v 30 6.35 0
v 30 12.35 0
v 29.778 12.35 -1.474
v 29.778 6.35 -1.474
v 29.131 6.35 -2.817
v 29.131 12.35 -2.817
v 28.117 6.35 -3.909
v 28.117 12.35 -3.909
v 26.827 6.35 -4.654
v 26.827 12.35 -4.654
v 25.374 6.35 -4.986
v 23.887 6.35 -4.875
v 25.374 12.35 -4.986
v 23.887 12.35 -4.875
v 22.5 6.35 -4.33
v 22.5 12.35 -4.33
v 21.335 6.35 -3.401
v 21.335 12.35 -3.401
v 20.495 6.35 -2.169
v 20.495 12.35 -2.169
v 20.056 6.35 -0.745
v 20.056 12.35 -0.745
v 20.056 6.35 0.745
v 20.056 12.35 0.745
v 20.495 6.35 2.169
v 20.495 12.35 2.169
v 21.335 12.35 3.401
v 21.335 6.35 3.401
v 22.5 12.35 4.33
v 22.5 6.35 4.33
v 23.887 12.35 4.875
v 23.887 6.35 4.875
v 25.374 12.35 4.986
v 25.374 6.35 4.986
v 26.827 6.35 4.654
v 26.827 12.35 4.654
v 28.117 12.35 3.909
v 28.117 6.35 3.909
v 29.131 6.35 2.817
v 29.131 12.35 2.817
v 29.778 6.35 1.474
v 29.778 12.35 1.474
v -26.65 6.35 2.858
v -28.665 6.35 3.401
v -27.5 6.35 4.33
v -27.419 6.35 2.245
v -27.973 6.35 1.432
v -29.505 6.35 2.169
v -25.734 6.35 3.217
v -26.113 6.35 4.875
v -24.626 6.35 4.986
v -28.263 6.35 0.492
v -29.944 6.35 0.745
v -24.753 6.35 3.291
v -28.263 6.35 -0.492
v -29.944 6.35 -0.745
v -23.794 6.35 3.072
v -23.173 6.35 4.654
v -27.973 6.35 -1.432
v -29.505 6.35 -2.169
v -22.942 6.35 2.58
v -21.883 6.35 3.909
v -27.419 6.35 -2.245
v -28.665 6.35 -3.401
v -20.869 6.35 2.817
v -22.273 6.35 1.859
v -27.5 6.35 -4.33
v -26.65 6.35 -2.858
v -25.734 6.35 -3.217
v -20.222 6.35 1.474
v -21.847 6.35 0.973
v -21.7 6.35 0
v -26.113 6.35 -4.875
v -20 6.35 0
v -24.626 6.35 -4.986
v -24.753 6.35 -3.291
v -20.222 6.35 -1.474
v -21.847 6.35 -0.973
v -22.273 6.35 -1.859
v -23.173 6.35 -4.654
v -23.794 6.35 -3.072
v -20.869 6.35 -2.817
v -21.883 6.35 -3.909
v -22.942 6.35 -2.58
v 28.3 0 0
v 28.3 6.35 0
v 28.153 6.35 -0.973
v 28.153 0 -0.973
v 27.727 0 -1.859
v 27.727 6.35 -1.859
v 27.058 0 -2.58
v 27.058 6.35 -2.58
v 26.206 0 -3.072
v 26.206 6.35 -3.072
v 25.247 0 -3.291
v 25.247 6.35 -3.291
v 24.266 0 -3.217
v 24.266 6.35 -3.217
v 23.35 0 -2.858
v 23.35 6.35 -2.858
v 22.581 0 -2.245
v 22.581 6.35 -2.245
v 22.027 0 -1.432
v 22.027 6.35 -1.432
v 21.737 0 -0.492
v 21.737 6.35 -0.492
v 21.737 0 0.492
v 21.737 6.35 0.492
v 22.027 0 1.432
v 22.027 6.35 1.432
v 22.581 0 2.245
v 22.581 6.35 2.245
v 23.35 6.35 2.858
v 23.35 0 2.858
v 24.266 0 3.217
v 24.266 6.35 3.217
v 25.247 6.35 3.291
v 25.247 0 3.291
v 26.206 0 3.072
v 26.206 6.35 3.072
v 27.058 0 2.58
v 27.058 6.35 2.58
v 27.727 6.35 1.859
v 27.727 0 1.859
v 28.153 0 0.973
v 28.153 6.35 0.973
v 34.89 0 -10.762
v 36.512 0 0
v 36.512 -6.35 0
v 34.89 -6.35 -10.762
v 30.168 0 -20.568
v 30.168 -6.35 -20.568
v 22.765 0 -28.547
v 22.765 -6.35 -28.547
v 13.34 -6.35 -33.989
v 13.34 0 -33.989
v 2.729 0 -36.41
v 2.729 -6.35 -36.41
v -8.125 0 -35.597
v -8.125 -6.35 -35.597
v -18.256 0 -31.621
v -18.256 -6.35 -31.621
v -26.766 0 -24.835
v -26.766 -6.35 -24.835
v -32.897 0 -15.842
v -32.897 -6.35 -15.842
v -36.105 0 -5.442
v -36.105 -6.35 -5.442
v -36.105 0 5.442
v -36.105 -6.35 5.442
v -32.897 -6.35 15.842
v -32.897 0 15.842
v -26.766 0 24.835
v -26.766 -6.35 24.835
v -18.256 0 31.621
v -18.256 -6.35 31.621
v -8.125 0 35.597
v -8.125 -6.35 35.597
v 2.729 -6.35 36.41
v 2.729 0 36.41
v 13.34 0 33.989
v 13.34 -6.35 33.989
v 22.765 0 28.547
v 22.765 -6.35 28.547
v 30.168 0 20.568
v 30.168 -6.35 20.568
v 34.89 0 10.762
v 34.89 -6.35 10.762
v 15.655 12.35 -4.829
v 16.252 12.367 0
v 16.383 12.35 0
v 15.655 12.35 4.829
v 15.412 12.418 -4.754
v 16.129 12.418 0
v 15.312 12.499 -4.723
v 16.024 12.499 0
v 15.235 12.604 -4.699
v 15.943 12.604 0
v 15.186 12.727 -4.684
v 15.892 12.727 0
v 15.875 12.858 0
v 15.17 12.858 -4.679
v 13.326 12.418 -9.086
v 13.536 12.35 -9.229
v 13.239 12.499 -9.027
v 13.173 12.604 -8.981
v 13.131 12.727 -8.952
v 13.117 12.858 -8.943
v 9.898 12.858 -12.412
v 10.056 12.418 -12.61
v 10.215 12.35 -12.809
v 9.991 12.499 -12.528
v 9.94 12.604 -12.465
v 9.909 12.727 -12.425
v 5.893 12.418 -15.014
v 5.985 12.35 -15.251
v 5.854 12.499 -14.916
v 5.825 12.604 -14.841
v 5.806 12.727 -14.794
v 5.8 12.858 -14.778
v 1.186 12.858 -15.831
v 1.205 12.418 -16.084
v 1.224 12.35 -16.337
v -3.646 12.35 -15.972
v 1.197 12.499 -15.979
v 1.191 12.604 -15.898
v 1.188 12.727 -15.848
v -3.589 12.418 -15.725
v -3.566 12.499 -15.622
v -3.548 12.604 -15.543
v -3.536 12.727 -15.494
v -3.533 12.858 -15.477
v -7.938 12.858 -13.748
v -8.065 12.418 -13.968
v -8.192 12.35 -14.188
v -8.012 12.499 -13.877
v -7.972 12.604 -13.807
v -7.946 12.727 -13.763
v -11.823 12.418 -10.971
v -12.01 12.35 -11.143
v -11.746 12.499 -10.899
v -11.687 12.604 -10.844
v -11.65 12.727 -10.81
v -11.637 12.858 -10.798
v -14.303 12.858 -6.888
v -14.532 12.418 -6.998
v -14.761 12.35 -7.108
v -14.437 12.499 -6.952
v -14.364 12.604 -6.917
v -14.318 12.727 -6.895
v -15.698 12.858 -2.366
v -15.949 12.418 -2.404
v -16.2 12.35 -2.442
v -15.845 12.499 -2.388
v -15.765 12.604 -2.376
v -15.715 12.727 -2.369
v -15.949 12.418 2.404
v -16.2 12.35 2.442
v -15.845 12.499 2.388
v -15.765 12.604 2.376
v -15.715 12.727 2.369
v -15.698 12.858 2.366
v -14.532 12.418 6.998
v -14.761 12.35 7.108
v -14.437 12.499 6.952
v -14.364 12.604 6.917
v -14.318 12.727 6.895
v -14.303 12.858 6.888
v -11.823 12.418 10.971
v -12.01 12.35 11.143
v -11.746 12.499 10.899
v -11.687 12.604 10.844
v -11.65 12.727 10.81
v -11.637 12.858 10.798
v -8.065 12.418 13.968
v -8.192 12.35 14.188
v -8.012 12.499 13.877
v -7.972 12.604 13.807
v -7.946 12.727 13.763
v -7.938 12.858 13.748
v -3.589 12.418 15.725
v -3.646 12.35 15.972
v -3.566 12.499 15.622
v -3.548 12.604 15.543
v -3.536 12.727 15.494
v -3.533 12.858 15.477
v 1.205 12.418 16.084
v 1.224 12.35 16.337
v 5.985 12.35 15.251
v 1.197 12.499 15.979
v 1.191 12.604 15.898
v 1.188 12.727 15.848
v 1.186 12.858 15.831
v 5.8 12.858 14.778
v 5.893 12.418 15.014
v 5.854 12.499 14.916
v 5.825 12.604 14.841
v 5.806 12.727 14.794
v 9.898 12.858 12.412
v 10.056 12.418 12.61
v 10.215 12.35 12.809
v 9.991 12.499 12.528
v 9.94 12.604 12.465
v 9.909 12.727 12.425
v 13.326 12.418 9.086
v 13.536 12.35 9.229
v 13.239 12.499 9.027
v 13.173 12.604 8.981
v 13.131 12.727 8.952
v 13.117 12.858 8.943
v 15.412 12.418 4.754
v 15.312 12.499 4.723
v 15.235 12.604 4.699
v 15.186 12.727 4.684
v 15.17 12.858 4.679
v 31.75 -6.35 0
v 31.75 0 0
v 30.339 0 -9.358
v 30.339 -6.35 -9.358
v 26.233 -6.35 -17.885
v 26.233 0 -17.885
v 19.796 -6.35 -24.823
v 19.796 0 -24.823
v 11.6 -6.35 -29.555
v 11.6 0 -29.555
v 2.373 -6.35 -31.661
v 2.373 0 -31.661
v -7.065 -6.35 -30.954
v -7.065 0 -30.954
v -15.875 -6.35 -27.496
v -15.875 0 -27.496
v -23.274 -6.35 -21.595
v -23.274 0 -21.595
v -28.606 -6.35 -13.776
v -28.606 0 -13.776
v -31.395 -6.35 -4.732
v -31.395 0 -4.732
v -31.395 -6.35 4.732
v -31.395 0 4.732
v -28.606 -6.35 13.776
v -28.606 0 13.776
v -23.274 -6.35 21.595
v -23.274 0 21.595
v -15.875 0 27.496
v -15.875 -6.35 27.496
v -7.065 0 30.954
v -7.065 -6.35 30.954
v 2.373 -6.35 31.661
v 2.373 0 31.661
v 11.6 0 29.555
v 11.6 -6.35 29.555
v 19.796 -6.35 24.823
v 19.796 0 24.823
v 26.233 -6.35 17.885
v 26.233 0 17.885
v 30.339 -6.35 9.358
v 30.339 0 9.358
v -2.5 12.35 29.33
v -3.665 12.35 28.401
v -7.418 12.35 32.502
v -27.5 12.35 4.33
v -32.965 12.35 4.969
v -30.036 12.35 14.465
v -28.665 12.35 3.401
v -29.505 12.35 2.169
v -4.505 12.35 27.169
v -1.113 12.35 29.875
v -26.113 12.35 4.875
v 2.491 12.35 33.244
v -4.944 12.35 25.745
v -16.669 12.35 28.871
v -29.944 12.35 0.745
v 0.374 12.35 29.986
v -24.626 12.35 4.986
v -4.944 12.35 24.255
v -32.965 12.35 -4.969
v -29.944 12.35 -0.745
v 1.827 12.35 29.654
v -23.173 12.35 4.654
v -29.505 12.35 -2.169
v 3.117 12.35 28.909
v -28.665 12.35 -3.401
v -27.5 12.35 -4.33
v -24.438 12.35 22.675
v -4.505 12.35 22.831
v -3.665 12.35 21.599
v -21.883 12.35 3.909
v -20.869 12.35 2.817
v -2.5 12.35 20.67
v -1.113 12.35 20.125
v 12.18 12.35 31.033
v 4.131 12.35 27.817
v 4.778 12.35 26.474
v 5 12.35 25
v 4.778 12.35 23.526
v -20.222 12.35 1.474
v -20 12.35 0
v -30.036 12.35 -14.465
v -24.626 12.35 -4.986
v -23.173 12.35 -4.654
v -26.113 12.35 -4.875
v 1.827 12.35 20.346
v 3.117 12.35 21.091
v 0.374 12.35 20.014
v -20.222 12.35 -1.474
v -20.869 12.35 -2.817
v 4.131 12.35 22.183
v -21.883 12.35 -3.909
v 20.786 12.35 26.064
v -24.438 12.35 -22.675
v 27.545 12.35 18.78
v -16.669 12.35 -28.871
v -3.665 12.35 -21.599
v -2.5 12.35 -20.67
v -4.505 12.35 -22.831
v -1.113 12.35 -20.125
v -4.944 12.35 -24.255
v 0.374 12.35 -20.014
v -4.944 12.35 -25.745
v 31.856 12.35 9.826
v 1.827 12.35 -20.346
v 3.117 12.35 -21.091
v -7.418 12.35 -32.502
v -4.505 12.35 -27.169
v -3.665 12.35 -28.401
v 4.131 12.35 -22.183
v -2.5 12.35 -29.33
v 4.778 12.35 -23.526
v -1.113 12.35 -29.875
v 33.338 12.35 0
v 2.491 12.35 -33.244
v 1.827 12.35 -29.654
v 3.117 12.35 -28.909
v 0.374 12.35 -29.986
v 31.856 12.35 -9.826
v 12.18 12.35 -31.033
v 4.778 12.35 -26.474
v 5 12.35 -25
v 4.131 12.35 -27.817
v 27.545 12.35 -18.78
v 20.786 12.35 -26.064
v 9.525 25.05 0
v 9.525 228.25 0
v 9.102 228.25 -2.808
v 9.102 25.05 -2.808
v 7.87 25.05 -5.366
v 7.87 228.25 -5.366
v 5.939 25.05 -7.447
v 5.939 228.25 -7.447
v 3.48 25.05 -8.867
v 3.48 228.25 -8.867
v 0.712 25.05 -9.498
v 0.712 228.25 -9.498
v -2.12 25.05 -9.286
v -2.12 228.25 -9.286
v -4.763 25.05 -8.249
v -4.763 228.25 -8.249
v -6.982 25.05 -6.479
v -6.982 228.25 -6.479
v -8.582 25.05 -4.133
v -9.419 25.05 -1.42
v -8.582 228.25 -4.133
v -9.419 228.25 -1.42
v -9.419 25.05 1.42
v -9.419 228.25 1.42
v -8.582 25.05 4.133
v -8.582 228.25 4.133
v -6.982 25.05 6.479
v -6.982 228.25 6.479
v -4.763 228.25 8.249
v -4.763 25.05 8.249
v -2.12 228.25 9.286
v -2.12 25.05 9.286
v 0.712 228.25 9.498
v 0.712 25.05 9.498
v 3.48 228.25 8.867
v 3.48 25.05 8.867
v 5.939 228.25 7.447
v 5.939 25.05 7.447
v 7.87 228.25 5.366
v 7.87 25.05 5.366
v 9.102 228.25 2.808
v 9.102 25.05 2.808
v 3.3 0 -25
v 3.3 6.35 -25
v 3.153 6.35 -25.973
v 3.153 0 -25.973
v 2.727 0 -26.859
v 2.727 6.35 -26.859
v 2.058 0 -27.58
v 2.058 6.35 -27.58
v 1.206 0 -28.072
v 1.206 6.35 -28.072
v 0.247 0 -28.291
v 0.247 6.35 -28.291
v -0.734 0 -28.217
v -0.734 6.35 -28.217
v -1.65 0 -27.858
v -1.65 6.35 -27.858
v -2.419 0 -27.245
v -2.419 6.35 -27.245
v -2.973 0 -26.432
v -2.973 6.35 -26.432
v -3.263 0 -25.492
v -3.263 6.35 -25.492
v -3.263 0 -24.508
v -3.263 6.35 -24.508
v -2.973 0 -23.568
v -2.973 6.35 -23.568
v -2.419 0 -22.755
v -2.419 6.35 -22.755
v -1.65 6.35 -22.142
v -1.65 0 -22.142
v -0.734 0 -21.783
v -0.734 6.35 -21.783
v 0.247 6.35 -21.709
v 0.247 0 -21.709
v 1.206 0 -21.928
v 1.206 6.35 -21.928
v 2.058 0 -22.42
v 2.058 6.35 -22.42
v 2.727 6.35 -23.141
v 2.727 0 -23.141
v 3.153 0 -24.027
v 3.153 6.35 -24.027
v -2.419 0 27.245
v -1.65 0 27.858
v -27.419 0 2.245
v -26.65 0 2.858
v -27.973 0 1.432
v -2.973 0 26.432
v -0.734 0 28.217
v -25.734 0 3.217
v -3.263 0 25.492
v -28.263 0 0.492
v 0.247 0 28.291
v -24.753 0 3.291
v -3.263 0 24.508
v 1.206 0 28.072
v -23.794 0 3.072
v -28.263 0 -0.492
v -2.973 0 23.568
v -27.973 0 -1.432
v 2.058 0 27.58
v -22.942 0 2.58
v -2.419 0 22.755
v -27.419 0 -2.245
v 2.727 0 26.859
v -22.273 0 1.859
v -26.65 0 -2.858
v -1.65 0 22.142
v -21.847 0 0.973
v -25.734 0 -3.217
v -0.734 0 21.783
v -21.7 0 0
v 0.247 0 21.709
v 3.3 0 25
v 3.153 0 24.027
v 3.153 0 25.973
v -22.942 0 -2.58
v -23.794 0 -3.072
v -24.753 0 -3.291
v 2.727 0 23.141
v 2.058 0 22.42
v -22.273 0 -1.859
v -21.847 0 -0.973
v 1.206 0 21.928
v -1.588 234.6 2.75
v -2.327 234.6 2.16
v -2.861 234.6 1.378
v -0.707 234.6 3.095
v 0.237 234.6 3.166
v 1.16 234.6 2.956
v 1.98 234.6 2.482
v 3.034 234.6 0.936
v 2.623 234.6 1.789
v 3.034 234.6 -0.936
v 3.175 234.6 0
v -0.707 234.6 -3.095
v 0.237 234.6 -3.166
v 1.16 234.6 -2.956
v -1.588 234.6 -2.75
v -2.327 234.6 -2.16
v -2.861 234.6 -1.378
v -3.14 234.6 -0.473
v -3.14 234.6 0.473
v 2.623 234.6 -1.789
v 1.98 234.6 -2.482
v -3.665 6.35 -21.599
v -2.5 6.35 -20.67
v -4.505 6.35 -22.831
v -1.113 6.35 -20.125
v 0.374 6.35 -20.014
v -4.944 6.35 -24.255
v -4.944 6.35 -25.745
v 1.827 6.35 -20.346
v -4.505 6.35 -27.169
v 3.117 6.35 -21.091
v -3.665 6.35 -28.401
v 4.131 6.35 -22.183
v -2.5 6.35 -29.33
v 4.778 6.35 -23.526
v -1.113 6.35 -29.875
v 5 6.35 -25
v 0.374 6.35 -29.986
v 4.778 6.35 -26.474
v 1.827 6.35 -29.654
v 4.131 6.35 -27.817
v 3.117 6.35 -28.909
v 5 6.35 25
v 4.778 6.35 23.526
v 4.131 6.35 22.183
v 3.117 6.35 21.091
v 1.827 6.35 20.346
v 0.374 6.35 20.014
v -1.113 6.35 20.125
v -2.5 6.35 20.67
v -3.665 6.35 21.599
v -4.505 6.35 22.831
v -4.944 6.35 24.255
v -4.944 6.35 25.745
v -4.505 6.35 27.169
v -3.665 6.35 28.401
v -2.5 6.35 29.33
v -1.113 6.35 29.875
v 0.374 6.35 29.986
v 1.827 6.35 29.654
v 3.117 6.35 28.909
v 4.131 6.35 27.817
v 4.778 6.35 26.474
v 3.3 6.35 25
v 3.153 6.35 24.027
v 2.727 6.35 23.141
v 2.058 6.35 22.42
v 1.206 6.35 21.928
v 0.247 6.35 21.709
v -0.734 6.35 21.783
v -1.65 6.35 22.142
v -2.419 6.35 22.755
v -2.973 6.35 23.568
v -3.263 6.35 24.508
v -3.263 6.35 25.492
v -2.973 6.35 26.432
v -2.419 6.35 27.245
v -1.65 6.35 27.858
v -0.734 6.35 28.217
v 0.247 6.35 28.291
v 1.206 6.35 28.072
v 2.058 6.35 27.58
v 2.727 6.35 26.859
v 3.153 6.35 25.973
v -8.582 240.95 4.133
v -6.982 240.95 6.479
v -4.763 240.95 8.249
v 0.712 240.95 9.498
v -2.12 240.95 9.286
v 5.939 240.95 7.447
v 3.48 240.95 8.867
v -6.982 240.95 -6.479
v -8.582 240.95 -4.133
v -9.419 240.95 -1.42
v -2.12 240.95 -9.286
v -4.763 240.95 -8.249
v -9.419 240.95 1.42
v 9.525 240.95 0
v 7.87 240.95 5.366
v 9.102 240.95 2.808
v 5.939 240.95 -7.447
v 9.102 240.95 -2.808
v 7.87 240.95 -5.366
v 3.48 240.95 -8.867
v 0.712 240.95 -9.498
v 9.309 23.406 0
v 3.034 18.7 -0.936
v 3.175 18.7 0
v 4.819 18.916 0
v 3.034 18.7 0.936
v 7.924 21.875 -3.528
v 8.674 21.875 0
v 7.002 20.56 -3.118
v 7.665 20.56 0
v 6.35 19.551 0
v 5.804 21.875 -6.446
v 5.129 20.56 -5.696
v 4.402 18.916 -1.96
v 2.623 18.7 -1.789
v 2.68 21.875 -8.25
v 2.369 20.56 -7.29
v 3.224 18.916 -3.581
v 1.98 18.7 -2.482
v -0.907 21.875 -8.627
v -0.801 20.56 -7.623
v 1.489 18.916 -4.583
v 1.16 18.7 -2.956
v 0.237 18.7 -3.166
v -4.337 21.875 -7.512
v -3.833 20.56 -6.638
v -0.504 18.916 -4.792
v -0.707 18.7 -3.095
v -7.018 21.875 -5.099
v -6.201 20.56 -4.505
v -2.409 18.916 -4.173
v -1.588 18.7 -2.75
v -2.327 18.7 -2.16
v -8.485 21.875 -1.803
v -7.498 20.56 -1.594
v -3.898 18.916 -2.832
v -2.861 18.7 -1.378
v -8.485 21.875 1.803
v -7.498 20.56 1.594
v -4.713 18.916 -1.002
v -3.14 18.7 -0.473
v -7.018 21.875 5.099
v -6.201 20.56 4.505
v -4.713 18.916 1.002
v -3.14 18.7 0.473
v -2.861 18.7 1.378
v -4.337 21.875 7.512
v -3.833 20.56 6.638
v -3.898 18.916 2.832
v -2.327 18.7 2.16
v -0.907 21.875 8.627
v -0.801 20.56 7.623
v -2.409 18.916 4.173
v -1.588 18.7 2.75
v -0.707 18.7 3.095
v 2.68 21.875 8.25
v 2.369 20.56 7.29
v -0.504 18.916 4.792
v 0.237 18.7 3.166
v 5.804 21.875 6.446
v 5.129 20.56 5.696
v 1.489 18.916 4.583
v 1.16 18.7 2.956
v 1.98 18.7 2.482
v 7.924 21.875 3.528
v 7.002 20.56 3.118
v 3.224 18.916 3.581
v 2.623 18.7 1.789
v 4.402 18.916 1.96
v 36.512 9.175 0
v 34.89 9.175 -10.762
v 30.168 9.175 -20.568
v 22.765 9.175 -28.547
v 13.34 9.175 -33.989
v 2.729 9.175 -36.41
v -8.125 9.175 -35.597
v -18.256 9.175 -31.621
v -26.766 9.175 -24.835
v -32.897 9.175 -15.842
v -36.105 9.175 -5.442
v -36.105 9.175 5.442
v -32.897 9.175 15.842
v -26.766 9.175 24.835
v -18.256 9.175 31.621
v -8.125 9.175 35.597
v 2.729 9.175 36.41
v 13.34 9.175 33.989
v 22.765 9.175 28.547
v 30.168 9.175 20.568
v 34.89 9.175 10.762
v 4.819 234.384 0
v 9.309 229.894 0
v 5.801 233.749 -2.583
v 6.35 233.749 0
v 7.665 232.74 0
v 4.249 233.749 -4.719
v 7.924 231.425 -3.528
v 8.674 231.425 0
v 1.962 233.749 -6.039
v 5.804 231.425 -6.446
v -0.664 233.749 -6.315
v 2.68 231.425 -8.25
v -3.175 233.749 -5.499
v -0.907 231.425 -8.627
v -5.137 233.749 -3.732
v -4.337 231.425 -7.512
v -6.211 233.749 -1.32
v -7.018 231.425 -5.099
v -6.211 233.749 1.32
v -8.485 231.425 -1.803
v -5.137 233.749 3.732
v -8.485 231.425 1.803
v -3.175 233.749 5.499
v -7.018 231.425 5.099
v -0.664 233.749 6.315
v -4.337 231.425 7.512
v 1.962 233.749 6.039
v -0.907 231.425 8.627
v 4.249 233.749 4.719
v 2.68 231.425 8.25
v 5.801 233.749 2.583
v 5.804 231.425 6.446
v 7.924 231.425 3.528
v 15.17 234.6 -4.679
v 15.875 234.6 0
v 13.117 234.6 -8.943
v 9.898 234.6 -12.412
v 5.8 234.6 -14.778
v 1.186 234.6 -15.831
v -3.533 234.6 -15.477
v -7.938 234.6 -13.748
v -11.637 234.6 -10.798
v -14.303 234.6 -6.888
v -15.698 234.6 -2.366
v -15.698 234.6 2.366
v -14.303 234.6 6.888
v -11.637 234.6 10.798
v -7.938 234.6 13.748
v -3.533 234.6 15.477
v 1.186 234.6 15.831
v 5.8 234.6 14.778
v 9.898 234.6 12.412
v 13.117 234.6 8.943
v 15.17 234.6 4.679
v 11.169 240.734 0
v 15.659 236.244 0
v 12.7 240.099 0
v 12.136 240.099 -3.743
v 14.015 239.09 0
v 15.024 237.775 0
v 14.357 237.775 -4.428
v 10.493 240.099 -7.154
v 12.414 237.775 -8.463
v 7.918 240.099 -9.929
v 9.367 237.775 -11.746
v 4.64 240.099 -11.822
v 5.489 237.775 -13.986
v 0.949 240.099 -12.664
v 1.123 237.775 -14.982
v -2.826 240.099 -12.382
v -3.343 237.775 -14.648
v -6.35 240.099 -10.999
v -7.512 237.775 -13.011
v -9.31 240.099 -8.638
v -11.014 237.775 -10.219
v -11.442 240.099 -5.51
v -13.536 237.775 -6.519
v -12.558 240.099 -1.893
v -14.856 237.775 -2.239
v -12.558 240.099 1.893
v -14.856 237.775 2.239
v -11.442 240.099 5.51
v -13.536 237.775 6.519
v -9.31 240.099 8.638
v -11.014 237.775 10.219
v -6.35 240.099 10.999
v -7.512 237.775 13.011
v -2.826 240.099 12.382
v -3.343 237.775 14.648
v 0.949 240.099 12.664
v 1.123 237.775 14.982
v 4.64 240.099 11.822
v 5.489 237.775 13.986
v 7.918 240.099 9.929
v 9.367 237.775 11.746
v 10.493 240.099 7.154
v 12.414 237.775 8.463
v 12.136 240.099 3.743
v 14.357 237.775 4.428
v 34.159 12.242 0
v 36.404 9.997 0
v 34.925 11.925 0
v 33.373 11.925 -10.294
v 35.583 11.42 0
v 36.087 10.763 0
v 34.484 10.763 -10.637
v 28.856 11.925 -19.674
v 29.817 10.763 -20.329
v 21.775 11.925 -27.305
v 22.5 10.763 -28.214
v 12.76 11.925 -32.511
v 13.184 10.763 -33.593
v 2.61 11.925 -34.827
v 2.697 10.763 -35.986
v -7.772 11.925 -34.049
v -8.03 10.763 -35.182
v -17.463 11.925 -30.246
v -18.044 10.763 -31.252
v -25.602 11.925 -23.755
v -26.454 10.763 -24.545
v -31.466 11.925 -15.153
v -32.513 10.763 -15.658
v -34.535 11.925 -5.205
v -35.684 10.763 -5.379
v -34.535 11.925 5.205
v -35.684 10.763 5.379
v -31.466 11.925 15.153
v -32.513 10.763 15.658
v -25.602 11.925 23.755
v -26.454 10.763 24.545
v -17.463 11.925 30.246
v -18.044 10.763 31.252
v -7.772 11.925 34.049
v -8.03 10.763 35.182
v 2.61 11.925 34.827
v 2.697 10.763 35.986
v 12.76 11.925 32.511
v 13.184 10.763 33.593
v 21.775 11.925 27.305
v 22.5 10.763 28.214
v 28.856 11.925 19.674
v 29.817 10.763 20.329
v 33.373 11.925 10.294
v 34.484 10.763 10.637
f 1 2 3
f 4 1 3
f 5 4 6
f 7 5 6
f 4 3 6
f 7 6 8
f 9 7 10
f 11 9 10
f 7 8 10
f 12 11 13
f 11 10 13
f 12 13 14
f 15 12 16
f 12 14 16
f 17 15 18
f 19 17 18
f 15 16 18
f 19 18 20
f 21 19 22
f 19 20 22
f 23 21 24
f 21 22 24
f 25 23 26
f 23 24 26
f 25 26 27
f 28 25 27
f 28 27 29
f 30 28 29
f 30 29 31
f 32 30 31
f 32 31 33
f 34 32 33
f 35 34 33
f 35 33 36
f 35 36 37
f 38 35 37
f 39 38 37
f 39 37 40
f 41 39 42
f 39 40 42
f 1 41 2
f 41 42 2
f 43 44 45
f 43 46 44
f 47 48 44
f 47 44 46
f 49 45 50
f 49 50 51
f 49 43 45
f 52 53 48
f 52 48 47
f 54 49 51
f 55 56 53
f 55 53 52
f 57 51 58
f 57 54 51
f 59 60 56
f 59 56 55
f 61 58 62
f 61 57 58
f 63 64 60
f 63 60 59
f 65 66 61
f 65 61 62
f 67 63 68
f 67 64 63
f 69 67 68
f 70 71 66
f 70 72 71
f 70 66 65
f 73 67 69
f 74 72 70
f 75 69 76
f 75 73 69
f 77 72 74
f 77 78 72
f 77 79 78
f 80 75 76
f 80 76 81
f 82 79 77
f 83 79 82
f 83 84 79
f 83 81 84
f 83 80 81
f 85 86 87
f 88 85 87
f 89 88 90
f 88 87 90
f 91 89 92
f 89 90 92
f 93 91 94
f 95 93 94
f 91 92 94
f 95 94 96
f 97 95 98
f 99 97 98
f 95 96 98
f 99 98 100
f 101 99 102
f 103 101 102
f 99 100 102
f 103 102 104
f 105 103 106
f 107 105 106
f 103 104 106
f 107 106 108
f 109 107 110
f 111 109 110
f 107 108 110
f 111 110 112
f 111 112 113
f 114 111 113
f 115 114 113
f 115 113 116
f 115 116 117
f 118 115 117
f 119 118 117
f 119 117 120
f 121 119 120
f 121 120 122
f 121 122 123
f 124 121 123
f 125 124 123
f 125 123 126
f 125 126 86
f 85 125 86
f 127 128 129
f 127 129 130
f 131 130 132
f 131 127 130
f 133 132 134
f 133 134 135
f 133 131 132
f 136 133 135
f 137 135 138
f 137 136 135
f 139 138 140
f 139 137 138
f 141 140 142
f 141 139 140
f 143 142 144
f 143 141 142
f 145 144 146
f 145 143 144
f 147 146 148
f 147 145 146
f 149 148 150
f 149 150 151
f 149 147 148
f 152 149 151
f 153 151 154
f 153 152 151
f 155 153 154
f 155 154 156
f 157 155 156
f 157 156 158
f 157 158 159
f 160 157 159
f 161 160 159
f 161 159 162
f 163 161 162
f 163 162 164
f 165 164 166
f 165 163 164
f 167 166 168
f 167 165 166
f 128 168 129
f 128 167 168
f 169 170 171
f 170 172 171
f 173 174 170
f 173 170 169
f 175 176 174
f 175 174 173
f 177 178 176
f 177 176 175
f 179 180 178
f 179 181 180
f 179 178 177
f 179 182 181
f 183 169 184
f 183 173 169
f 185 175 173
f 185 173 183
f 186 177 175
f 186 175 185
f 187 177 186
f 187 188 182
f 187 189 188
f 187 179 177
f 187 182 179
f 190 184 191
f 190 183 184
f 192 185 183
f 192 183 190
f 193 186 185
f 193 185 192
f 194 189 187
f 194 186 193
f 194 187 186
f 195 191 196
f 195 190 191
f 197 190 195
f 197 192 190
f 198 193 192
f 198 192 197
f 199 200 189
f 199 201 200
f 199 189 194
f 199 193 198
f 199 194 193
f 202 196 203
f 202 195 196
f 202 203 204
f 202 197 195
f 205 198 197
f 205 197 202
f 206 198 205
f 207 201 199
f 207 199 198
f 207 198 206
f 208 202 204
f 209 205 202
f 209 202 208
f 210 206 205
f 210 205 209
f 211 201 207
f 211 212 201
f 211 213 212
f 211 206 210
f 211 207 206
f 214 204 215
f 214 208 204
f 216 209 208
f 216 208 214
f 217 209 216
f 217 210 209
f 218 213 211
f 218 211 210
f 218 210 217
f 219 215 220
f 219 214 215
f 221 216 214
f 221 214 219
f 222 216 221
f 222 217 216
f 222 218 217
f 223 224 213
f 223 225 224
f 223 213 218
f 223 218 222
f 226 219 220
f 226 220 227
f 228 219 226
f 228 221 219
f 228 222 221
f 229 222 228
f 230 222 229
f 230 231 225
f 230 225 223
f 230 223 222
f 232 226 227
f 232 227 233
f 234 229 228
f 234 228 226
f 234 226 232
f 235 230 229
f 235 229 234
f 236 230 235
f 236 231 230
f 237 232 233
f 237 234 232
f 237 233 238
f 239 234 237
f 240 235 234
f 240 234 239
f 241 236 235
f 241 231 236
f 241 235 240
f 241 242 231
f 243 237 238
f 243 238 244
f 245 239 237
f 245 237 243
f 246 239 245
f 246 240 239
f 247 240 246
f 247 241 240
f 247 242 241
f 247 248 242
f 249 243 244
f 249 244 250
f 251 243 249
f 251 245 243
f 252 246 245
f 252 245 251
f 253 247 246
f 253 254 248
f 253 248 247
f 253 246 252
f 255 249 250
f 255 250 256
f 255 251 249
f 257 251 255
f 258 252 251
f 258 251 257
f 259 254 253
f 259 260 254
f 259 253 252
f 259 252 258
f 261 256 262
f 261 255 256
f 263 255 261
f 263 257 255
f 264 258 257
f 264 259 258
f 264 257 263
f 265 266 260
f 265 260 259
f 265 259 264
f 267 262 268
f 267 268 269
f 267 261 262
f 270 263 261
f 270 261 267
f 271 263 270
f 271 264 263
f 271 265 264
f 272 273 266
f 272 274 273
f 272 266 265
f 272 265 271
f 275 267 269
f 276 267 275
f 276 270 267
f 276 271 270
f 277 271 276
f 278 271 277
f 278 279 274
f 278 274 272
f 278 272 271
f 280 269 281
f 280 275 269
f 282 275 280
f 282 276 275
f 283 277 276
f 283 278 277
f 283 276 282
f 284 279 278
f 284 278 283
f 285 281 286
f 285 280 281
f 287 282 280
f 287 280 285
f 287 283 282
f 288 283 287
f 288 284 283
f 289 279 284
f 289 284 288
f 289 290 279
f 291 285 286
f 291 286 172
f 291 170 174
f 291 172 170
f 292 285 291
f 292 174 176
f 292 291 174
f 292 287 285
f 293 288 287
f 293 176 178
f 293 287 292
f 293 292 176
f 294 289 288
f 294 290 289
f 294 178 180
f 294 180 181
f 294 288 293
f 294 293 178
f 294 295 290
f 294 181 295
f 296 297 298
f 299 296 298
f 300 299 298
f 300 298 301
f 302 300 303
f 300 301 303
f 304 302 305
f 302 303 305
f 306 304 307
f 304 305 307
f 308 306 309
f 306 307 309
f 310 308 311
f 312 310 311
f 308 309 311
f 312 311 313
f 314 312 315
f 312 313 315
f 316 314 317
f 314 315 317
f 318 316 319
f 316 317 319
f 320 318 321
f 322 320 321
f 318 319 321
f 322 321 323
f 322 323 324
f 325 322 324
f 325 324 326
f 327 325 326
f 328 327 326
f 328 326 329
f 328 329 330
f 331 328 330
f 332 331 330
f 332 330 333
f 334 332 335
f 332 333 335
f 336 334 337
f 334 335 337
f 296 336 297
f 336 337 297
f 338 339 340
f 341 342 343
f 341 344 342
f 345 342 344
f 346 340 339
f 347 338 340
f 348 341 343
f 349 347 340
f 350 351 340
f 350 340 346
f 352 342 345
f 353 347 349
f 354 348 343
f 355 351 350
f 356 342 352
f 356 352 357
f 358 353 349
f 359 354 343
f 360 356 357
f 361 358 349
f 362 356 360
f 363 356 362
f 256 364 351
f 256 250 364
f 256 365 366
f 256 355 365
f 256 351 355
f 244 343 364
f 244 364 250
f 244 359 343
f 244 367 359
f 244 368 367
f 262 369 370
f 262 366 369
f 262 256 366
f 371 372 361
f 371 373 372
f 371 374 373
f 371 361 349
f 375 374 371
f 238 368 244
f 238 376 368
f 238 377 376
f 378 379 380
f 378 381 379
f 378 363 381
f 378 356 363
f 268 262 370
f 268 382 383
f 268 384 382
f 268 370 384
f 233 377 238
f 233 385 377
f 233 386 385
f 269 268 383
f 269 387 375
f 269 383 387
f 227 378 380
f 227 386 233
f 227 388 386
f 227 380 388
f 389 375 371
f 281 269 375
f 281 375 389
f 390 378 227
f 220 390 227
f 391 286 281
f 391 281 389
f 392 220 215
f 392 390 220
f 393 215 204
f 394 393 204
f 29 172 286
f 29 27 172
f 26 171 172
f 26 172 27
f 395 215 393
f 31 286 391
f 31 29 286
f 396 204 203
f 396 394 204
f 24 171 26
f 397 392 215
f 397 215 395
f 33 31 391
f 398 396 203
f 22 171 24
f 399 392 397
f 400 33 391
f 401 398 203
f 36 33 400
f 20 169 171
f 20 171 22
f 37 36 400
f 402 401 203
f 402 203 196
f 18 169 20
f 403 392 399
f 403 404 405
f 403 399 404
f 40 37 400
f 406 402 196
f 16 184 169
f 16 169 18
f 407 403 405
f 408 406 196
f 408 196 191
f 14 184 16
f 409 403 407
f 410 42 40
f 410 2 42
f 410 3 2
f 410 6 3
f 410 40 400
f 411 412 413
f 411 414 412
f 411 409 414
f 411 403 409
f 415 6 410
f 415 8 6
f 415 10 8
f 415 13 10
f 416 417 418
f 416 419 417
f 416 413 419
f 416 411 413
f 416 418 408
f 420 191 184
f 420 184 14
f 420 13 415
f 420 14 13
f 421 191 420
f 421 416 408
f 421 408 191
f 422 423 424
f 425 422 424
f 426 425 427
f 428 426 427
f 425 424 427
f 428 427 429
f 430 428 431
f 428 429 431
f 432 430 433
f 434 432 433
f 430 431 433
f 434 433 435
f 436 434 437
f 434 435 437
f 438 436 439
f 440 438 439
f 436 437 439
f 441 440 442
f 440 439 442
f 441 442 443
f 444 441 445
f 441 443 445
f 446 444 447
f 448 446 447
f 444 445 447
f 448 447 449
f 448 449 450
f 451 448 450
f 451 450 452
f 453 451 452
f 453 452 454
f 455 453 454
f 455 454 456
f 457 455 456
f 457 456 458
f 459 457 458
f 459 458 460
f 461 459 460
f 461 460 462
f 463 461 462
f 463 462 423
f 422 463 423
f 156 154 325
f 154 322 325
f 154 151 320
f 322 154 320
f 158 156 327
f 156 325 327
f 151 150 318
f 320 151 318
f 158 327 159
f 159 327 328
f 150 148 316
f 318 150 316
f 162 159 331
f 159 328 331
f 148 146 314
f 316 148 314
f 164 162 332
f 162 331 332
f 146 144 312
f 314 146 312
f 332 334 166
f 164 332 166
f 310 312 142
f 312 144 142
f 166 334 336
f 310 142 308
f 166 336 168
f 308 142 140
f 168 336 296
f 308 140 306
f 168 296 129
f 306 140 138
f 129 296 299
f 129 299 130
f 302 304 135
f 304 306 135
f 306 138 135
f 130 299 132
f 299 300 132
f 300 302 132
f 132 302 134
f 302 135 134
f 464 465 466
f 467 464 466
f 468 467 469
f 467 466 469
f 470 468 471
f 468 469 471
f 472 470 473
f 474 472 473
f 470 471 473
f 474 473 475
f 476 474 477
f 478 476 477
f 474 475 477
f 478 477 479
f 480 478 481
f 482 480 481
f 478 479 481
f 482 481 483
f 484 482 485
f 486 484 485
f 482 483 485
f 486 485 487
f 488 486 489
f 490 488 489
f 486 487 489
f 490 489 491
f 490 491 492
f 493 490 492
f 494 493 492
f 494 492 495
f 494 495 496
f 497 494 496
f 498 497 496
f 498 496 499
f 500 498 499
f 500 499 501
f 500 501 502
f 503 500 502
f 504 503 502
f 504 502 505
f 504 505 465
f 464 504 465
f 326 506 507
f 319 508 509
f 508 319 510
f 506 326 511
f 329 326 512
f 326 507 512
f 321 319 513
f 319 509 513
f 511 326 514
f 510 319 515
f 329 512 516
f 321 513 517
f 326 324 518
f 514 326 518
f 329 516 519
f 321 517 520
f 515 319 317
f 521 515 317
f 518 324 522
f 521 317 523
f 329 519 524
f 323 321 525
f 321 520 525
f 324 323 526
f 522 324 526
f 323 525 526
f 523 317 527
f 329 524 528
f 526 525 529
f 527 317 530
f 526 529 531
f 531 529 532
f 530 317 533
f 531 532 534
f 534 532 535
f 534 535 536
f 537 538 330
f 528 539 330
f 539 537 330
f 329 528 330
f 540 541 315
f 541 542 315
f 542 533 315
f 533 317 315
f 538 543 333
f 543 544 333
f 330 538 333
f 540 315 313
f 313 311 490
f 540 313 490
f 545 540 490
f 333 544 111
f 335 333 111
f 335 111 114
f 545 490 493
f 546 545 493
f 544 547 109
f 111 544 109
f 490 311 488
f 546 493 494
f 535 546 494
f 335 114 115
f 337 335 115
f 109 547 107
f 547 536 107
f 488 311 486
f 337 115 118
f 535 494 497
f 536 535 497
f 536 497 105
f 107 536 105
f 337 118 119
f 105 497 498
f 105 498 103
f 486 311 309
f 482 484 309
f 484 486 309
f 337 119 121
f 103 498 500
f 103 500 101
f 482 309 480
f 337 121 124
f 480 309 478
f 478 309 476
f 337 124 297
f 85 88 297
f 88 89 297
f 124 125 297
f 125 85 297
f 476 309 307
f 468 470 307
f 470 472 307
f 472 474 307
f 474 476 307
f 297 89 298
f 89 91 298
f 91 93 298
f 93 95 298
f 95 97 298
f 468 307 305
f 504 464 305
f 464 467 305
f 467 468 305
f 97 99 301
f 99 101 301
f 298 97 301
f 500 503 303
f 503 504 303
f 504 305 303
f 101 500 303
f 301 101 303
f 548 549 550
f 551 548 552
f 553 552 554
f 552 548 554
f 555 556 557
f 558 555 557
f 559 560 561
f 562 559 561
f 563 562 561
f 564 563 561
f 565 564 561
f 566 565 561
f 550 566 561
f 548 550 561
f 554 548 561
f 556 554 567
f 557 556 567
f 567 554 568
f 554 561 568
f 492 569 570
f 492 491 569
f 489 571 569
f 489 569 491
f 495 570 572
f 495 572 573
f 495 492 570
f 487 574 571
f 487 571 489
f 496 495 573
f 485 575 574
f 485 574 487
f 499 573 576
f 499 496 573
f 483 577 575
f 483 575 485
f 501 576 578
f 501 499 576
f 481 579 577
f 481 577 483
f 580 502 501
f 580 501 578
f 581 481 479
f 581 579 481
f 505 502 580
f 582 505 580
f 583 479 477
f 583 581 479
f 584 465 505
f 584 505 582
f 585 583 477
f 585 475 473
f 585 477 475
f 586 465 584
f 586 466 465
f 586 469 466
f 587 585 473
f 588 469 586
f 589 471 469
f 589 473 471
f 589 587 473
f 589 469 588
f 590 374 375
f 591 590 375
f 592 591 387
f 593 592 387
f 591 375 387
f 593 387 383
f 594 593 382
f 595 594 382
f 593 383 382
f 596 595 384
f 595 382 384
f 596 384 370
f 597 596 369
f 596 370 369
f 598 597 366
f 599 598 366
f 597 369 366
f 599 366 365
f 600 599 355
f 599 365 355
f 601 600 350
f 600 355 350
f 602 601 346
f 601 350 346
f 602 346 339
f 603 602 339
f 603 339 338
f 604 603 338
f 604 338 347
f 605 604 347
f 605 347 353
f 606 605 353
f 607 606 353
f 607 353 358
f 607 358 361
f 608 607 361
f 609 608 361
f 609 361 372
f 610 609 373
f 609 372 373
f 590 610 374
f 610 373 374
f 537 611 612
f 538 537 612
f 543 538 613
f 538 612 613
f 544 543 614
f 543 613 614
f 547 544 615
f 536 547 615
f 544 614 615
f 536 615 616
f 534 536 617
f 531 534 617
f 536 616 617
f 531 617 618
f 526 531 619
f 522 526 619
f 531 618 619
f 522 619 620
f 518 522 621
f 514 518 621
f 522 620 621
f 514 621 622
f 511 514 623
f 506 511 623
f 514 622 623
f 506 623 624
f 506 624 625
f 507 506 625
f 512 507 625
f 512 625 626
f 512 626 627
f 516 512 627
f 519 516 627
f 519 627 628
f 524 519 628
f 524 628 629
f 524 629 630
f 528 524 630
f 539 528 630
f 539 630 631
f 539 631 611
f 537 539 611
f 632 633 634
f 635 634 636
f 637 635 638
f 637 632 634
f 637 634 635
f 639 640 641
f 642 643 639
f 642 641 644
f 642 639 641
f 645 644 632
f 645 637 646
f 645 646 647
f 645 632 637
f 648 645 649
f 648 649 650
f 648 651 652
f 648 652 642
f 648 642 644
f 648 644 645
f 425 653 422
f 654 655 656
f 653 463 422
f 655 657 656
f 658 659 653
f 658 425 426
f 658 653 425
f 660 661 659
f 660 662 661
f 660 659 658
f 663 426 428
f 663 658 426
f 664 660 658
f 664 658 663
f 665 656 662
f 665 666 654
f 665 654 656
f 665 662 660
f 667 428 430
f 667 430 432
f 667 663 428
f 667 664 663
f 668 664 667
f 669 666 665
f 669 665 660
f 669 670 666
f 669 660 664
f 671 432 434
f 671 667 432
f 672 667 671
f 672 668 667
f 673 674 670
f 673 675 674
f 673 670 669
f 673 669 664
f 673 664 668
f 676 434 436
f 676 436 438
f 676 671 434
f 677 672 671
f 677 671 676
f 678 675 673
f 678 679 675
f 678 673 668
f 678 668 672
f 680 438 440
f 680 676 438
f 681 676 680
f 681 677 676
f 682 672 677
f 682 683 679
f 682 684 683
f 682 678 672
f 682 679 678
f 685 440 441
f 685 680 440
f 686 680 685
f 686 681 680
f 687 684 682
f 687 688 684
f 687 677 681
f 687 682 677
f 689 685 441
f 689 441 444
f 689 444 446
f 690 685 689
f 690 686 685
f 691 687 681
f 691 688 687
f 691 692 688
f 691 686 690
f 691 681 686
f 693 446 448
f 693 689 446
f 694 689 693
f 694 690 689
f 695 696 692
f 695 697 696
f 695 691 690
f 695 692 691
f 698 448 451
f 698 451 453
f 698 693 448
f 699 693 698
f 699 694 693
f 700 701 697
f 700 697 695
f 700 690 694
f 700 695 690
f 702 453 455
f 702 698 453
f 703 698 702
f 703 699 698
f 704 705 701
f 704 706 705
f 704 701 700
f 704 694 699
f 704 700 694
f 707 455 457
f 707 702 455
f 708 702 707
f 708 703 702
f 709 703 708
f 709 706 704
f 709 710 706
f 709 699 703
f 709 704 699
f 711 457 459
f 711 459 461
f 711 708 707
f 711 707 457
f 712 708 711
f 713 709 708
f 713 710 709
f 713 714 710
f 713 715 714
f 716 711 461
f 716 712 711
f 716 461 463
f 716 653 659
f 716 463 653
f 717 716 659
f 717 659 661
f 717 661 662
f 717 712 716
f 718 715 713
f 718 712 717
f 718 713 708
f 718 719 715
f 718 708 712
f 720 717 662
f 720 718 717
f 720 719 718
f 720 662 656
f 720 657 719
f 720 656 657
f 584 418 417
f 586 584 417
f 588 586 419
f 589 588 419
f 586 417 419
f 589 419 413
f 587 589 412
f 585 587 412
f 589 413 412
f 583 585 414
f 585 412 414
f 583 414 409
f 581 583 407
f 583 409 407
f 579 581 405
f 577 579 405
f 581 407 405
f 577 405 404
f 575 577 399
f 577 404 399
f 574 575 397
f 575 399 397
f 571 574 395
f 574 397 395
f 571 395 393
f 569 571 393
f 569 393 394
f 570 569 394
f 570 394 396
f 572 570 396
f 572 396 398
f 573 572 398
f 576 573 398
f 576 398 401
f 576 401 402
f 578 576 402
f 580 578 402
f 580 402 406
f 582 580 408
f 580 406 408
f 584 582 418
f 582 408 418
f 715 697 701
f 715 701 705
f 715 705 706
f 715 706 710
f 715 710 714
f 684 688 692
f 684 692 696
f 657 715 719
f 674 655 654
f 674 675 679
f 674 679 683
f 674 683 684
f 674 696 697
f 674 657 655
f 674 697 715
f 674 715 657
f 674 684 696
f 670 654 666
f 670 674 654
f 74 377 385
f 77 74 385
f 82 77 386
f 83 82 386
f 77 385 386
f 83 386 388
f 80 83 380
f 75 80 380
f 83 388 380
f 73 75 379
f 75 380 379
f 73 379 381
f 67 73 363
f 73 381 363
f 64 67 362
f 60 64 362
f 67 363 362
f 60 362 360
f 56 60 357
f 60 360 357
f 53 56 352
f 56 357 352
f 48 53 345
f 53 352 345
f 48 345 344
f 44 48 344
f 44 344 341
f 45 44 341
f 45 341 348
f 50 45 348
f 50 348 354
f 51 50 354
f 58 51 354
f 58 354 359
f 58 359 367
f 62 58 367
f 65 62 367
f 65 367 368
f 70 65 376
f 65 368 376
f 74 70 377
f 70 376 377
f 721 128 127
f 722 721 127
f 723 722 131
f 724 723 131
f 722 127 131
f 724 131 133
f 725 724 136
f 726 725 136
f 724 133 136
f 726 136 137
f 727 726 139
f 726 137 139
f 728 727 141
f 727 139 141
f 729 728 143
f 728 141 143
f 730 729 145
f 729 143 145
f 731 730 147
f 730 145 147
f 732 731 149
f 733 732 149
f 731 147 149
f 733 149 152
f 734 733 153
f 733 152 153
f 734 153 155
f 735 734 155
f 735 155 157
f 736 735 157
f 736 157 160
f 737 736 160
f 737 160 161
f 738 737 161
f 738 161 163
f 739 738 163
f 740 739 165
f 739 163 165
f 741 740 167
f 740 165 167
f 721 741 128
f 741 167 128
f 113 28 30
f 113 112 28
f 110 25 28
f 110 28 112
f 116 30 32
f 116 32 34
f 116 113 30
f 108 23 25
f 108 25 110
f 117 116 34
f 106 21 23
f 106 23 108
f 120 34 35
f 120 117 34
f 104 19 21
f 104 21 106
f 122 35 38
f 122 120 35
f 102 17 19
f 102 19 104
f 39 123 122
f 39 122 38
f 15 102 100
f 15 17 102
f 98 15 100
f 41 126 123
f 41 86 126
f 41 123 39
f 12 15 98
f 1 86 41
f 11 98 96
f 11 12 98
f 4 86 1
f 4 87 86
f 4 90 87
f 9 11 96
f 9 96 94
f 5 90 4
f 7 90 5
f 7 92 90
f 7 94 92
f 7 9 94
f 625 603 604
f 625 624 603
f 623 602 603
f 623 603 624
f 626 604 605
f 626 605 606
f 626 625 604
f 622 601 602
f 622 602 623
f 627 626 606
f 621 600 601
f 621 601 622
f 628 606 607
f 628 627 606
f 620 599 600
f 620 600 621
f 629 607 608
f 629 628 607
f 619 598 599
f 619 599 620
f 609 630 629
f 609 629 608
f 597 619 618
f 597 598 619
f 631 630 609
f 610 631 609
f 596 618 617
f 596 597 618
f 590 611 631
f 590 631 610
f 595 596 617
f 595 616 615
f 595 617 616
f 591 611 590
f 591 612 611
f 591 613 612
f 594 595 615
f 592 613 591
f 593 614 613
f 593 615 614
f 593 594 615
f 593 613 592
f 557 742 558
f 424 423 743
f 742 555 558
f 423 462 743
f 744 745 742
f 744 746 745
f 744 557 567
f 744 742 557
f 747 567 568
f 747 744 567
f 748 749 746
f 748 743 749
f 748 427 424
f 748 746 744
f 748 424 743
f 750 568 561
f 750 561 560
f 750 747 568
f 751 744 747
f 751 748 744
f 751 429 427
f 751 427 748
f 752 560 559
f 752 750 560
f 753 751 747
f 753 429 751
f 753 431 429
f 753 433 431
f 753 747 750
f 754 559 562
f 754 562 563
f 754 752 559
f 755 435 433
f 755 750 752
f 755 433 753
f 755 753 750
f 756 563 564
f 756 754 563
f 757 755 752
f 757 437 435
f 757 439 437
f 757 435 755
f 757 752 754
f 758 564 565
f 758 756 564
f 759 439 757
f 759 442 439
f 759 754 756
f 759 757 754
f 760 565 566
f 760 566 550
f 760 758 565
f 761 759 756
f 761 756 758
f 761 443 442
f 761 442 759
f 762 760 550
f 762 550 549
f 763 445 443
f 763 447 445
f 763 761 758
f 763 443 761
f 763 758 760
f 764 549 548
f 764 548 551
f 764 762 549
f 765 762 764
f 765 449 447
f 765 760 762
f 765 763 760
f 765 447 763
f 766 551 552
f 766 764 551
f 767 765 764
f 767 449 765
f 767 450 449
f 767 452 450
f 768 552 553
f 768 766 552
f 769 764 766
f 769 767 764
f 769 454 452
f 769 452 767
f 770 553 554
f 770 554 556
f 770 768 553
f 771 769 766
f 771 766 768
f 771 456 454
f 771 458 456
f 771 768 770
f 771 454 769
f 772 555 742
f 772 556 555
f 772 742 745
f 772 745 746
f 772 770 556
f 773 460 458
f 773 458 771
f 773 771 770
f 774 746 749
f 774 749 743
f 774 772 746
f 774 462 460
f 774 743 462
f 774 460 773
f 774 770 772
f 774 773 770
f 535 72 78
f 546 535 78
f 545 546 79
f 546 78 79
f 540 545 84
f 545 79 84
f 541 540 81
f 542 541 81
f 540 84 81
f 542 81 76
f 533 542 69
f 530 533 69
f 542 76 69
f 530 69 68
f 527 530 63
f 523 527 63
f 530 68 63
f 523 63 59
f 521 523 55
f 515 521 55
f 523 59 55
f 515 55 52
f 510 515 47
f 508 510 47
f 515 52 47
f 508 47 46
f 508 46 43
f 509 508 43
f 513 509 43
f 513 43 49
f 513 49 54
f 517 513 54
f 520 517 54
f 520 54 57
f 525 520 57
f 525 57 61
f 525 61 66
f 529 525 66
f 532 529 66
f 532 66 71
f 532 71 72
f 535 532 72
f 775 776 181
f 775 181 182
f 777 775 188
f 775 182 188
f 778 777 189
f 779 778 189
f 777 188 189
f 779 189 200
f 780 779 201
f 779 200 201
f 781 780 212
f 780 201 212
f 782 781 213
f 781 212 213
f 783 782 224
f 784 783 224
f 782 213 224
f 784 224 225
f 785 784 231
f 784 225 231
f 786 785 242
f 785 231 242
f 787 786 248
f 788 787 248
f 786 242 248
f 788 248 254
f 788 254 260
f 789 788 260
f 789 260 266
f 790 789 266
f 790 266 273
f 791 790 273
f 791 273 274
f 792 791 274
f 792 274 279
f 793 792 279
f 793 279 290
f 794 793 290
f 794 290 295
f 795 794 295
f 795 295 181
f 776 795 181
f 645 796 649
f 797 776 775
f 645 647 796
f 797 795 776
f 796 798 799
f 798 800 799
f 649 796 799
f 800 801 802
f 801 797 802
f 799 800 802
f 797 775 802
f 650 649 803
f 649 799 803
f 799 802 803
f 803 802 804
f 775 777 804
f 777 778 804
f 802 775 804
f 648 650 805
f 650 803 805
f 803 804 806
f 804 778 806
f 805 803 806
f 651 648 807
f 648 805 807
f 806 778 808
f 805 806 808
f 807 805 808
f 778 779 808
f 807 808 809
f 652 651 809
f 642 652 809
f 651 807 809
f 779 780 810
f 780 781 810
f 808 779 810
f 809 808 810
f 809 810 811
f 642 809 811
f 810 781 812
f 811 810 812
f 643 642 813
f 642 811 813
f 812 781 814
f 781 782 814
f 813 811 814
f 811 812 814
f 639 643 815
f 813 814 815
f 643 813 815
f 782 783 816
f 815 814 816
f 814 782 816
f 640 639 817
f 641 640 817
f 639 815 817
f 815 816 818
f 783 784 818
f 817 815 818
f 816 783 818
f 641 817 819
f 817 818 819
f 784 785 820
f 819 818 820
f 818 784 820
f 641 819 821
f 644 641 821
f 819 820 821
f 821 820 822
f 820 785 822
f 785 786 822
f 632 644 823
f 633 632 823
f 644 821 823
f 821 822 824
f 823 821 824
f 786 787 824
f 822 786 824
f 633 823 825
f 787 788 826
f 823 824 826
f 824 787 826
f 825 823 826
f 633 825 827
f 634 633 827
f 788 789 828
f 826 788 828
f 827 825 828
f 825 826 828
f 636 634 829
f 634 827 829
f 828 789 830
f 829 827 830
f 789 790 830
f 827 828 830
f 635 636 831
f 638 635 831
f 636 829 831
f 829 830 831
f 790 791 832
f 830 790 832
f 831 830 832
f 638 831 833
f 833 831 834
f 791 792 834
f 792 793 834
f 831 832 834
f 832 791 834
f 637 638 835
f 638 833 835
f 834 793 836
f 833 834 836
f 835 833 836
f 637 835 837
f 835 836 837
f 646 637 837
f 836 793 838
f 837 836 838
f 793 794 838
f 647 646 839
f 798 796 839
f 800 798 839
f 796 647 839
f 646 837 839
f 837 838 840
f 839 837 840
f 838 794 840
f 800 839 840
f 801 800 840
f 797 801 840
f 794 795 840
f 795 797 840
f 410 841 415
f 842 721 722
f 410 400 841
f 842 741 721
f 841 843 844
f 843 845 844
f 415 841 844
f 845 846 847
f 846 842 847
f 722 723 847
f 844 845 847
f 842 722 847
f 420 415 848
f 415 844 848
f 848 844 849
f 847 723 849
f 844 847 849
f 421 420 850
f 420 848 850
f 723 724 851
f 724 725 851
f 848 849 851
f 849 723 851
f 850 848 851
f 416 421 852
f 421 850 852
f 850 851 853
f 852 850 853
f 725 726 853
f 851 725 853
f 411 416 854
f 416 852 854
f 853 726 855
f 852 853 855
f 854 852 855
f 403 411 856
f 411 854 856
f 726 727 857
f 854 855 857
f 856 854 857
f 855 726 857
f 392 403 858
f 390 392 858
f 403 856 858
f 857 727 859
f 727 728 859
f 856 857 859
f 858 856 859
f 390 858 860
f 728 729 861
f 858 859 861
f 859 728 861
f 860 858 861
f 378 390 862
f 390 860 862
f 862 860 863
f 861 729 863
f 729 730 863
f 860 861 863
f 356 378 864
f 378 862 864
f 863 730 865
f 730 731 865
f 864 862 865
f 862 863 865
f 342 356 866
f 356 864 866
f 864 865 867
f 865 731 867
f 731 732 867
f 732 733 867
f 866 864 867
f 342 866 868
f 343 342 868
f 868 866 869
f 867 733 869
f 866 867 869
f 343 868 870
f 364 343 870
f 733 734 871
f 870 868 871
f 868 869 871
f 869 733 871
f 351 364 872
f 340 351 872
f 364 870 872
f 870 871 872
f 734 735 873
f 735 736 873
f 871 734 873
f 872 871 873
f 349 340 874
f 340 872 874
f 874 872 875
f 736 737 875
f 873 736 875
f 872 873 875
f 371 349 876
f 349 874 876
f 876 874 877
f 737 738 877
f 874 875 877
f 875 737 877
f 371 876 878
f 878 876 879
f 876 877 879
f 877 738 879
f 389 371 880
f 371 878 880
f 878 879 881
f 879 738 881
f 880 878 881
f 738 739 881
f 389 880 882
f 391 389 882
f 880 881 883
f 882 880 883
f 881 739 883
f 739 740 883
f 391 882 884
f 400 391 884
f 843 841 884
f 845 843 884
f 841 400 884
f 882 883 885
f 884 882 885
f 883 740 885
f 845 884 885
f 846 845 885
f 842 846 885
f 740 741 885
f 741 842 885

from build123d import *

# Parameters (mm, degrees)
SKETCH1_R               = 36.5125
SKETCH1_R_2             = 31.75
BOSS_EXTRUDE1_DEPTH     = 6.35
SKETCH1_2_R             = 36.5125
BOSS_EXTRUDE2_DEPTH     = 12.35
SKETCH2_R               = 3.3
CUT_EXTRUDE1_DEPTH      = 1
CUT_EXTRUDE1_DEPTH_BACK = 19.7
SKETCH3_R               = 15.875
BOSS_EXTRUDE3_DEPTH     = 228.6
SKETCH4_R               = 5
CUT_EXTRUDE2_DEPTH      = 229.6
CUT_EXTRUDE2_DEPTH_BACK = 6
FILLET2_R               = 0.508
FILLET3_R               = 3.175
SKETCH5_R               = 9.525
CUT_EXTRUDE3_DEPTH      = 222.25
FILLET4_R               = 6.35
SKETCH6_R               = 15.875
BOSS_EXTRUDE4_DEPTH     = 6.35
FILLET5_R               = 6.35


with BuildPart() as part:
    # Sketch1 → Boss-Extrude1 (new body)
    with BuildSketch(Plane(origin=(0, 0, 0), x_dir=(1, 0, 0), z_dir=(0, 1, 0))):
        Circle(SKETCH1_R)
        Circle(SKETCH1_R_2, mode=Mode.SUBTRACT)
    extrude(amount=-BOSS_EXTRUDE1_DEPTH)

    # Sketch1<2> → Boss-Extrude2 (add)
    with BuildSketch(Plane(origin=(0, 0, 0), x_dir=(1, 0, 0), z_dir=(0, 1, 0))):
        Circle(SKETCH1_2_R)
    extrude(amount=BOSS_EXTRUDE2_DEPTH)

    # Sketch2 → Cut-Extrude1 (cut, two sides)
    with BuildSketch(Plane(origin=(0, 12.35, 0), x_dir=(1, 0, 0), z_dir=(0, 1, 0))) as cut_extrude1_sk:
        with Locations((0, 25)):
            Circle(SKETCH2_R)
        with Locations((25, 0)):
            Circle(SKETCH2_R)
        with Locations((0, -25)):
            Circle(SKETCH2_R)
        with Locations((-25, 0)):
            Circle(SKETCH2_R)
    extrude(amount=CUT_EXTRUDE1_DEPTH, mode=Mode.SUBTRACT)
    extrude(cut_extrude1_sk.sketch, amount=-CUT_EXTRUDE1_DEPTH_BACK, mode=Mode.SUBTRACT)

    # Sketch3 → Boss-Extrude3 (add)
    with BuildSketch(Plane(origin=(0, 12.35, 0), x_dir=(1, 0, 0), z_dir=(0, 1, 0))):
        Circle(SKETCH3_R)
    extrude(amount=BOSS_EXTRUDE3_DEPTH)

    # Sketch4 → Cut-Extrude2 (cut, two sides)
    with BuildSketch(Plane(origin=(0, 12.35, 0), x_dir=(1, 0, 0), z_dir=(0, 1, 0))) as cut_extrude2_sk:
        with Locations((-25, 0)):
            Circle(SKETCH4_R)
        with Locations((0, 25)):
            Circle(SKETCH4_R)
        with Locations((25, 0)):
            Circle(SKETCH4_R)
        with Locations((0, -25)):
            Circle(SKETCH4_R)
    extrude(amount=CUT_EXTRUDE2_DEPTH, mode=Mode.SUBTRACT)
    extrude(cut_extrude2_sk.sketch, amount=-CUT_EXTRUDE2_DEPTH_BACK, mode=Mode.SUBTRACT)

    # Fillet2
    fillet2_edges = [part.edges().sort_by_distance(p)[0] for p in [
        (-15.875, 12.35, 0),
    ]]
    fillet(fillet2_edges, radius=FILLET2_R)

    # Fillet3
    fillet3_edges = [part.edges().sort_by_distance(p)[0] for p in [
        (-36.5125, 12.35, 0),
    ]]
    fillet(fillet3_edges, radius=FILLET3_R)

    # Sketch5 → Cut-Extrude3 (cut)
    with BuildSketch(Plane(origin=(0, 240.95, 0), x_dir=(1, 0, 0), z_dir=(0, 1, 0))):
        Circle(SKETCH5_R)
    extrude(amount=-CUT_EXTRUDE3_DEPTH, mode=Mode.SUBTRACT)

    # Fillet4
    fillet4_edges = [part.edges().sort_by_distance(p)[0] for p in [
        (-9.525, 18.7, 0),
    ]]
    fillet(fillet4_edges, radius=FILLET4_R)

    # Sketch6 → Boss-Extrude4 (add)
    with BuildSketch(Plane(origin=(0, 240.95, 0), x_dir=(1, 0, 0), z_dir=(0, 1, 0))):
        Circle(SKETCH6_R)
    extrude(amount=-BOSS_EXTRUDE4_DEPTH)

    # Fillet5
    fillet5_edges = [part.edges().sort_by_distance(p)[0] for p in [
        (-15.875, 240.95, 0),
        (-9.525, 234.6, 0),
    ]]
    fillet(fillet5_edges, radius=FILLET5_R)


solid = part.part
